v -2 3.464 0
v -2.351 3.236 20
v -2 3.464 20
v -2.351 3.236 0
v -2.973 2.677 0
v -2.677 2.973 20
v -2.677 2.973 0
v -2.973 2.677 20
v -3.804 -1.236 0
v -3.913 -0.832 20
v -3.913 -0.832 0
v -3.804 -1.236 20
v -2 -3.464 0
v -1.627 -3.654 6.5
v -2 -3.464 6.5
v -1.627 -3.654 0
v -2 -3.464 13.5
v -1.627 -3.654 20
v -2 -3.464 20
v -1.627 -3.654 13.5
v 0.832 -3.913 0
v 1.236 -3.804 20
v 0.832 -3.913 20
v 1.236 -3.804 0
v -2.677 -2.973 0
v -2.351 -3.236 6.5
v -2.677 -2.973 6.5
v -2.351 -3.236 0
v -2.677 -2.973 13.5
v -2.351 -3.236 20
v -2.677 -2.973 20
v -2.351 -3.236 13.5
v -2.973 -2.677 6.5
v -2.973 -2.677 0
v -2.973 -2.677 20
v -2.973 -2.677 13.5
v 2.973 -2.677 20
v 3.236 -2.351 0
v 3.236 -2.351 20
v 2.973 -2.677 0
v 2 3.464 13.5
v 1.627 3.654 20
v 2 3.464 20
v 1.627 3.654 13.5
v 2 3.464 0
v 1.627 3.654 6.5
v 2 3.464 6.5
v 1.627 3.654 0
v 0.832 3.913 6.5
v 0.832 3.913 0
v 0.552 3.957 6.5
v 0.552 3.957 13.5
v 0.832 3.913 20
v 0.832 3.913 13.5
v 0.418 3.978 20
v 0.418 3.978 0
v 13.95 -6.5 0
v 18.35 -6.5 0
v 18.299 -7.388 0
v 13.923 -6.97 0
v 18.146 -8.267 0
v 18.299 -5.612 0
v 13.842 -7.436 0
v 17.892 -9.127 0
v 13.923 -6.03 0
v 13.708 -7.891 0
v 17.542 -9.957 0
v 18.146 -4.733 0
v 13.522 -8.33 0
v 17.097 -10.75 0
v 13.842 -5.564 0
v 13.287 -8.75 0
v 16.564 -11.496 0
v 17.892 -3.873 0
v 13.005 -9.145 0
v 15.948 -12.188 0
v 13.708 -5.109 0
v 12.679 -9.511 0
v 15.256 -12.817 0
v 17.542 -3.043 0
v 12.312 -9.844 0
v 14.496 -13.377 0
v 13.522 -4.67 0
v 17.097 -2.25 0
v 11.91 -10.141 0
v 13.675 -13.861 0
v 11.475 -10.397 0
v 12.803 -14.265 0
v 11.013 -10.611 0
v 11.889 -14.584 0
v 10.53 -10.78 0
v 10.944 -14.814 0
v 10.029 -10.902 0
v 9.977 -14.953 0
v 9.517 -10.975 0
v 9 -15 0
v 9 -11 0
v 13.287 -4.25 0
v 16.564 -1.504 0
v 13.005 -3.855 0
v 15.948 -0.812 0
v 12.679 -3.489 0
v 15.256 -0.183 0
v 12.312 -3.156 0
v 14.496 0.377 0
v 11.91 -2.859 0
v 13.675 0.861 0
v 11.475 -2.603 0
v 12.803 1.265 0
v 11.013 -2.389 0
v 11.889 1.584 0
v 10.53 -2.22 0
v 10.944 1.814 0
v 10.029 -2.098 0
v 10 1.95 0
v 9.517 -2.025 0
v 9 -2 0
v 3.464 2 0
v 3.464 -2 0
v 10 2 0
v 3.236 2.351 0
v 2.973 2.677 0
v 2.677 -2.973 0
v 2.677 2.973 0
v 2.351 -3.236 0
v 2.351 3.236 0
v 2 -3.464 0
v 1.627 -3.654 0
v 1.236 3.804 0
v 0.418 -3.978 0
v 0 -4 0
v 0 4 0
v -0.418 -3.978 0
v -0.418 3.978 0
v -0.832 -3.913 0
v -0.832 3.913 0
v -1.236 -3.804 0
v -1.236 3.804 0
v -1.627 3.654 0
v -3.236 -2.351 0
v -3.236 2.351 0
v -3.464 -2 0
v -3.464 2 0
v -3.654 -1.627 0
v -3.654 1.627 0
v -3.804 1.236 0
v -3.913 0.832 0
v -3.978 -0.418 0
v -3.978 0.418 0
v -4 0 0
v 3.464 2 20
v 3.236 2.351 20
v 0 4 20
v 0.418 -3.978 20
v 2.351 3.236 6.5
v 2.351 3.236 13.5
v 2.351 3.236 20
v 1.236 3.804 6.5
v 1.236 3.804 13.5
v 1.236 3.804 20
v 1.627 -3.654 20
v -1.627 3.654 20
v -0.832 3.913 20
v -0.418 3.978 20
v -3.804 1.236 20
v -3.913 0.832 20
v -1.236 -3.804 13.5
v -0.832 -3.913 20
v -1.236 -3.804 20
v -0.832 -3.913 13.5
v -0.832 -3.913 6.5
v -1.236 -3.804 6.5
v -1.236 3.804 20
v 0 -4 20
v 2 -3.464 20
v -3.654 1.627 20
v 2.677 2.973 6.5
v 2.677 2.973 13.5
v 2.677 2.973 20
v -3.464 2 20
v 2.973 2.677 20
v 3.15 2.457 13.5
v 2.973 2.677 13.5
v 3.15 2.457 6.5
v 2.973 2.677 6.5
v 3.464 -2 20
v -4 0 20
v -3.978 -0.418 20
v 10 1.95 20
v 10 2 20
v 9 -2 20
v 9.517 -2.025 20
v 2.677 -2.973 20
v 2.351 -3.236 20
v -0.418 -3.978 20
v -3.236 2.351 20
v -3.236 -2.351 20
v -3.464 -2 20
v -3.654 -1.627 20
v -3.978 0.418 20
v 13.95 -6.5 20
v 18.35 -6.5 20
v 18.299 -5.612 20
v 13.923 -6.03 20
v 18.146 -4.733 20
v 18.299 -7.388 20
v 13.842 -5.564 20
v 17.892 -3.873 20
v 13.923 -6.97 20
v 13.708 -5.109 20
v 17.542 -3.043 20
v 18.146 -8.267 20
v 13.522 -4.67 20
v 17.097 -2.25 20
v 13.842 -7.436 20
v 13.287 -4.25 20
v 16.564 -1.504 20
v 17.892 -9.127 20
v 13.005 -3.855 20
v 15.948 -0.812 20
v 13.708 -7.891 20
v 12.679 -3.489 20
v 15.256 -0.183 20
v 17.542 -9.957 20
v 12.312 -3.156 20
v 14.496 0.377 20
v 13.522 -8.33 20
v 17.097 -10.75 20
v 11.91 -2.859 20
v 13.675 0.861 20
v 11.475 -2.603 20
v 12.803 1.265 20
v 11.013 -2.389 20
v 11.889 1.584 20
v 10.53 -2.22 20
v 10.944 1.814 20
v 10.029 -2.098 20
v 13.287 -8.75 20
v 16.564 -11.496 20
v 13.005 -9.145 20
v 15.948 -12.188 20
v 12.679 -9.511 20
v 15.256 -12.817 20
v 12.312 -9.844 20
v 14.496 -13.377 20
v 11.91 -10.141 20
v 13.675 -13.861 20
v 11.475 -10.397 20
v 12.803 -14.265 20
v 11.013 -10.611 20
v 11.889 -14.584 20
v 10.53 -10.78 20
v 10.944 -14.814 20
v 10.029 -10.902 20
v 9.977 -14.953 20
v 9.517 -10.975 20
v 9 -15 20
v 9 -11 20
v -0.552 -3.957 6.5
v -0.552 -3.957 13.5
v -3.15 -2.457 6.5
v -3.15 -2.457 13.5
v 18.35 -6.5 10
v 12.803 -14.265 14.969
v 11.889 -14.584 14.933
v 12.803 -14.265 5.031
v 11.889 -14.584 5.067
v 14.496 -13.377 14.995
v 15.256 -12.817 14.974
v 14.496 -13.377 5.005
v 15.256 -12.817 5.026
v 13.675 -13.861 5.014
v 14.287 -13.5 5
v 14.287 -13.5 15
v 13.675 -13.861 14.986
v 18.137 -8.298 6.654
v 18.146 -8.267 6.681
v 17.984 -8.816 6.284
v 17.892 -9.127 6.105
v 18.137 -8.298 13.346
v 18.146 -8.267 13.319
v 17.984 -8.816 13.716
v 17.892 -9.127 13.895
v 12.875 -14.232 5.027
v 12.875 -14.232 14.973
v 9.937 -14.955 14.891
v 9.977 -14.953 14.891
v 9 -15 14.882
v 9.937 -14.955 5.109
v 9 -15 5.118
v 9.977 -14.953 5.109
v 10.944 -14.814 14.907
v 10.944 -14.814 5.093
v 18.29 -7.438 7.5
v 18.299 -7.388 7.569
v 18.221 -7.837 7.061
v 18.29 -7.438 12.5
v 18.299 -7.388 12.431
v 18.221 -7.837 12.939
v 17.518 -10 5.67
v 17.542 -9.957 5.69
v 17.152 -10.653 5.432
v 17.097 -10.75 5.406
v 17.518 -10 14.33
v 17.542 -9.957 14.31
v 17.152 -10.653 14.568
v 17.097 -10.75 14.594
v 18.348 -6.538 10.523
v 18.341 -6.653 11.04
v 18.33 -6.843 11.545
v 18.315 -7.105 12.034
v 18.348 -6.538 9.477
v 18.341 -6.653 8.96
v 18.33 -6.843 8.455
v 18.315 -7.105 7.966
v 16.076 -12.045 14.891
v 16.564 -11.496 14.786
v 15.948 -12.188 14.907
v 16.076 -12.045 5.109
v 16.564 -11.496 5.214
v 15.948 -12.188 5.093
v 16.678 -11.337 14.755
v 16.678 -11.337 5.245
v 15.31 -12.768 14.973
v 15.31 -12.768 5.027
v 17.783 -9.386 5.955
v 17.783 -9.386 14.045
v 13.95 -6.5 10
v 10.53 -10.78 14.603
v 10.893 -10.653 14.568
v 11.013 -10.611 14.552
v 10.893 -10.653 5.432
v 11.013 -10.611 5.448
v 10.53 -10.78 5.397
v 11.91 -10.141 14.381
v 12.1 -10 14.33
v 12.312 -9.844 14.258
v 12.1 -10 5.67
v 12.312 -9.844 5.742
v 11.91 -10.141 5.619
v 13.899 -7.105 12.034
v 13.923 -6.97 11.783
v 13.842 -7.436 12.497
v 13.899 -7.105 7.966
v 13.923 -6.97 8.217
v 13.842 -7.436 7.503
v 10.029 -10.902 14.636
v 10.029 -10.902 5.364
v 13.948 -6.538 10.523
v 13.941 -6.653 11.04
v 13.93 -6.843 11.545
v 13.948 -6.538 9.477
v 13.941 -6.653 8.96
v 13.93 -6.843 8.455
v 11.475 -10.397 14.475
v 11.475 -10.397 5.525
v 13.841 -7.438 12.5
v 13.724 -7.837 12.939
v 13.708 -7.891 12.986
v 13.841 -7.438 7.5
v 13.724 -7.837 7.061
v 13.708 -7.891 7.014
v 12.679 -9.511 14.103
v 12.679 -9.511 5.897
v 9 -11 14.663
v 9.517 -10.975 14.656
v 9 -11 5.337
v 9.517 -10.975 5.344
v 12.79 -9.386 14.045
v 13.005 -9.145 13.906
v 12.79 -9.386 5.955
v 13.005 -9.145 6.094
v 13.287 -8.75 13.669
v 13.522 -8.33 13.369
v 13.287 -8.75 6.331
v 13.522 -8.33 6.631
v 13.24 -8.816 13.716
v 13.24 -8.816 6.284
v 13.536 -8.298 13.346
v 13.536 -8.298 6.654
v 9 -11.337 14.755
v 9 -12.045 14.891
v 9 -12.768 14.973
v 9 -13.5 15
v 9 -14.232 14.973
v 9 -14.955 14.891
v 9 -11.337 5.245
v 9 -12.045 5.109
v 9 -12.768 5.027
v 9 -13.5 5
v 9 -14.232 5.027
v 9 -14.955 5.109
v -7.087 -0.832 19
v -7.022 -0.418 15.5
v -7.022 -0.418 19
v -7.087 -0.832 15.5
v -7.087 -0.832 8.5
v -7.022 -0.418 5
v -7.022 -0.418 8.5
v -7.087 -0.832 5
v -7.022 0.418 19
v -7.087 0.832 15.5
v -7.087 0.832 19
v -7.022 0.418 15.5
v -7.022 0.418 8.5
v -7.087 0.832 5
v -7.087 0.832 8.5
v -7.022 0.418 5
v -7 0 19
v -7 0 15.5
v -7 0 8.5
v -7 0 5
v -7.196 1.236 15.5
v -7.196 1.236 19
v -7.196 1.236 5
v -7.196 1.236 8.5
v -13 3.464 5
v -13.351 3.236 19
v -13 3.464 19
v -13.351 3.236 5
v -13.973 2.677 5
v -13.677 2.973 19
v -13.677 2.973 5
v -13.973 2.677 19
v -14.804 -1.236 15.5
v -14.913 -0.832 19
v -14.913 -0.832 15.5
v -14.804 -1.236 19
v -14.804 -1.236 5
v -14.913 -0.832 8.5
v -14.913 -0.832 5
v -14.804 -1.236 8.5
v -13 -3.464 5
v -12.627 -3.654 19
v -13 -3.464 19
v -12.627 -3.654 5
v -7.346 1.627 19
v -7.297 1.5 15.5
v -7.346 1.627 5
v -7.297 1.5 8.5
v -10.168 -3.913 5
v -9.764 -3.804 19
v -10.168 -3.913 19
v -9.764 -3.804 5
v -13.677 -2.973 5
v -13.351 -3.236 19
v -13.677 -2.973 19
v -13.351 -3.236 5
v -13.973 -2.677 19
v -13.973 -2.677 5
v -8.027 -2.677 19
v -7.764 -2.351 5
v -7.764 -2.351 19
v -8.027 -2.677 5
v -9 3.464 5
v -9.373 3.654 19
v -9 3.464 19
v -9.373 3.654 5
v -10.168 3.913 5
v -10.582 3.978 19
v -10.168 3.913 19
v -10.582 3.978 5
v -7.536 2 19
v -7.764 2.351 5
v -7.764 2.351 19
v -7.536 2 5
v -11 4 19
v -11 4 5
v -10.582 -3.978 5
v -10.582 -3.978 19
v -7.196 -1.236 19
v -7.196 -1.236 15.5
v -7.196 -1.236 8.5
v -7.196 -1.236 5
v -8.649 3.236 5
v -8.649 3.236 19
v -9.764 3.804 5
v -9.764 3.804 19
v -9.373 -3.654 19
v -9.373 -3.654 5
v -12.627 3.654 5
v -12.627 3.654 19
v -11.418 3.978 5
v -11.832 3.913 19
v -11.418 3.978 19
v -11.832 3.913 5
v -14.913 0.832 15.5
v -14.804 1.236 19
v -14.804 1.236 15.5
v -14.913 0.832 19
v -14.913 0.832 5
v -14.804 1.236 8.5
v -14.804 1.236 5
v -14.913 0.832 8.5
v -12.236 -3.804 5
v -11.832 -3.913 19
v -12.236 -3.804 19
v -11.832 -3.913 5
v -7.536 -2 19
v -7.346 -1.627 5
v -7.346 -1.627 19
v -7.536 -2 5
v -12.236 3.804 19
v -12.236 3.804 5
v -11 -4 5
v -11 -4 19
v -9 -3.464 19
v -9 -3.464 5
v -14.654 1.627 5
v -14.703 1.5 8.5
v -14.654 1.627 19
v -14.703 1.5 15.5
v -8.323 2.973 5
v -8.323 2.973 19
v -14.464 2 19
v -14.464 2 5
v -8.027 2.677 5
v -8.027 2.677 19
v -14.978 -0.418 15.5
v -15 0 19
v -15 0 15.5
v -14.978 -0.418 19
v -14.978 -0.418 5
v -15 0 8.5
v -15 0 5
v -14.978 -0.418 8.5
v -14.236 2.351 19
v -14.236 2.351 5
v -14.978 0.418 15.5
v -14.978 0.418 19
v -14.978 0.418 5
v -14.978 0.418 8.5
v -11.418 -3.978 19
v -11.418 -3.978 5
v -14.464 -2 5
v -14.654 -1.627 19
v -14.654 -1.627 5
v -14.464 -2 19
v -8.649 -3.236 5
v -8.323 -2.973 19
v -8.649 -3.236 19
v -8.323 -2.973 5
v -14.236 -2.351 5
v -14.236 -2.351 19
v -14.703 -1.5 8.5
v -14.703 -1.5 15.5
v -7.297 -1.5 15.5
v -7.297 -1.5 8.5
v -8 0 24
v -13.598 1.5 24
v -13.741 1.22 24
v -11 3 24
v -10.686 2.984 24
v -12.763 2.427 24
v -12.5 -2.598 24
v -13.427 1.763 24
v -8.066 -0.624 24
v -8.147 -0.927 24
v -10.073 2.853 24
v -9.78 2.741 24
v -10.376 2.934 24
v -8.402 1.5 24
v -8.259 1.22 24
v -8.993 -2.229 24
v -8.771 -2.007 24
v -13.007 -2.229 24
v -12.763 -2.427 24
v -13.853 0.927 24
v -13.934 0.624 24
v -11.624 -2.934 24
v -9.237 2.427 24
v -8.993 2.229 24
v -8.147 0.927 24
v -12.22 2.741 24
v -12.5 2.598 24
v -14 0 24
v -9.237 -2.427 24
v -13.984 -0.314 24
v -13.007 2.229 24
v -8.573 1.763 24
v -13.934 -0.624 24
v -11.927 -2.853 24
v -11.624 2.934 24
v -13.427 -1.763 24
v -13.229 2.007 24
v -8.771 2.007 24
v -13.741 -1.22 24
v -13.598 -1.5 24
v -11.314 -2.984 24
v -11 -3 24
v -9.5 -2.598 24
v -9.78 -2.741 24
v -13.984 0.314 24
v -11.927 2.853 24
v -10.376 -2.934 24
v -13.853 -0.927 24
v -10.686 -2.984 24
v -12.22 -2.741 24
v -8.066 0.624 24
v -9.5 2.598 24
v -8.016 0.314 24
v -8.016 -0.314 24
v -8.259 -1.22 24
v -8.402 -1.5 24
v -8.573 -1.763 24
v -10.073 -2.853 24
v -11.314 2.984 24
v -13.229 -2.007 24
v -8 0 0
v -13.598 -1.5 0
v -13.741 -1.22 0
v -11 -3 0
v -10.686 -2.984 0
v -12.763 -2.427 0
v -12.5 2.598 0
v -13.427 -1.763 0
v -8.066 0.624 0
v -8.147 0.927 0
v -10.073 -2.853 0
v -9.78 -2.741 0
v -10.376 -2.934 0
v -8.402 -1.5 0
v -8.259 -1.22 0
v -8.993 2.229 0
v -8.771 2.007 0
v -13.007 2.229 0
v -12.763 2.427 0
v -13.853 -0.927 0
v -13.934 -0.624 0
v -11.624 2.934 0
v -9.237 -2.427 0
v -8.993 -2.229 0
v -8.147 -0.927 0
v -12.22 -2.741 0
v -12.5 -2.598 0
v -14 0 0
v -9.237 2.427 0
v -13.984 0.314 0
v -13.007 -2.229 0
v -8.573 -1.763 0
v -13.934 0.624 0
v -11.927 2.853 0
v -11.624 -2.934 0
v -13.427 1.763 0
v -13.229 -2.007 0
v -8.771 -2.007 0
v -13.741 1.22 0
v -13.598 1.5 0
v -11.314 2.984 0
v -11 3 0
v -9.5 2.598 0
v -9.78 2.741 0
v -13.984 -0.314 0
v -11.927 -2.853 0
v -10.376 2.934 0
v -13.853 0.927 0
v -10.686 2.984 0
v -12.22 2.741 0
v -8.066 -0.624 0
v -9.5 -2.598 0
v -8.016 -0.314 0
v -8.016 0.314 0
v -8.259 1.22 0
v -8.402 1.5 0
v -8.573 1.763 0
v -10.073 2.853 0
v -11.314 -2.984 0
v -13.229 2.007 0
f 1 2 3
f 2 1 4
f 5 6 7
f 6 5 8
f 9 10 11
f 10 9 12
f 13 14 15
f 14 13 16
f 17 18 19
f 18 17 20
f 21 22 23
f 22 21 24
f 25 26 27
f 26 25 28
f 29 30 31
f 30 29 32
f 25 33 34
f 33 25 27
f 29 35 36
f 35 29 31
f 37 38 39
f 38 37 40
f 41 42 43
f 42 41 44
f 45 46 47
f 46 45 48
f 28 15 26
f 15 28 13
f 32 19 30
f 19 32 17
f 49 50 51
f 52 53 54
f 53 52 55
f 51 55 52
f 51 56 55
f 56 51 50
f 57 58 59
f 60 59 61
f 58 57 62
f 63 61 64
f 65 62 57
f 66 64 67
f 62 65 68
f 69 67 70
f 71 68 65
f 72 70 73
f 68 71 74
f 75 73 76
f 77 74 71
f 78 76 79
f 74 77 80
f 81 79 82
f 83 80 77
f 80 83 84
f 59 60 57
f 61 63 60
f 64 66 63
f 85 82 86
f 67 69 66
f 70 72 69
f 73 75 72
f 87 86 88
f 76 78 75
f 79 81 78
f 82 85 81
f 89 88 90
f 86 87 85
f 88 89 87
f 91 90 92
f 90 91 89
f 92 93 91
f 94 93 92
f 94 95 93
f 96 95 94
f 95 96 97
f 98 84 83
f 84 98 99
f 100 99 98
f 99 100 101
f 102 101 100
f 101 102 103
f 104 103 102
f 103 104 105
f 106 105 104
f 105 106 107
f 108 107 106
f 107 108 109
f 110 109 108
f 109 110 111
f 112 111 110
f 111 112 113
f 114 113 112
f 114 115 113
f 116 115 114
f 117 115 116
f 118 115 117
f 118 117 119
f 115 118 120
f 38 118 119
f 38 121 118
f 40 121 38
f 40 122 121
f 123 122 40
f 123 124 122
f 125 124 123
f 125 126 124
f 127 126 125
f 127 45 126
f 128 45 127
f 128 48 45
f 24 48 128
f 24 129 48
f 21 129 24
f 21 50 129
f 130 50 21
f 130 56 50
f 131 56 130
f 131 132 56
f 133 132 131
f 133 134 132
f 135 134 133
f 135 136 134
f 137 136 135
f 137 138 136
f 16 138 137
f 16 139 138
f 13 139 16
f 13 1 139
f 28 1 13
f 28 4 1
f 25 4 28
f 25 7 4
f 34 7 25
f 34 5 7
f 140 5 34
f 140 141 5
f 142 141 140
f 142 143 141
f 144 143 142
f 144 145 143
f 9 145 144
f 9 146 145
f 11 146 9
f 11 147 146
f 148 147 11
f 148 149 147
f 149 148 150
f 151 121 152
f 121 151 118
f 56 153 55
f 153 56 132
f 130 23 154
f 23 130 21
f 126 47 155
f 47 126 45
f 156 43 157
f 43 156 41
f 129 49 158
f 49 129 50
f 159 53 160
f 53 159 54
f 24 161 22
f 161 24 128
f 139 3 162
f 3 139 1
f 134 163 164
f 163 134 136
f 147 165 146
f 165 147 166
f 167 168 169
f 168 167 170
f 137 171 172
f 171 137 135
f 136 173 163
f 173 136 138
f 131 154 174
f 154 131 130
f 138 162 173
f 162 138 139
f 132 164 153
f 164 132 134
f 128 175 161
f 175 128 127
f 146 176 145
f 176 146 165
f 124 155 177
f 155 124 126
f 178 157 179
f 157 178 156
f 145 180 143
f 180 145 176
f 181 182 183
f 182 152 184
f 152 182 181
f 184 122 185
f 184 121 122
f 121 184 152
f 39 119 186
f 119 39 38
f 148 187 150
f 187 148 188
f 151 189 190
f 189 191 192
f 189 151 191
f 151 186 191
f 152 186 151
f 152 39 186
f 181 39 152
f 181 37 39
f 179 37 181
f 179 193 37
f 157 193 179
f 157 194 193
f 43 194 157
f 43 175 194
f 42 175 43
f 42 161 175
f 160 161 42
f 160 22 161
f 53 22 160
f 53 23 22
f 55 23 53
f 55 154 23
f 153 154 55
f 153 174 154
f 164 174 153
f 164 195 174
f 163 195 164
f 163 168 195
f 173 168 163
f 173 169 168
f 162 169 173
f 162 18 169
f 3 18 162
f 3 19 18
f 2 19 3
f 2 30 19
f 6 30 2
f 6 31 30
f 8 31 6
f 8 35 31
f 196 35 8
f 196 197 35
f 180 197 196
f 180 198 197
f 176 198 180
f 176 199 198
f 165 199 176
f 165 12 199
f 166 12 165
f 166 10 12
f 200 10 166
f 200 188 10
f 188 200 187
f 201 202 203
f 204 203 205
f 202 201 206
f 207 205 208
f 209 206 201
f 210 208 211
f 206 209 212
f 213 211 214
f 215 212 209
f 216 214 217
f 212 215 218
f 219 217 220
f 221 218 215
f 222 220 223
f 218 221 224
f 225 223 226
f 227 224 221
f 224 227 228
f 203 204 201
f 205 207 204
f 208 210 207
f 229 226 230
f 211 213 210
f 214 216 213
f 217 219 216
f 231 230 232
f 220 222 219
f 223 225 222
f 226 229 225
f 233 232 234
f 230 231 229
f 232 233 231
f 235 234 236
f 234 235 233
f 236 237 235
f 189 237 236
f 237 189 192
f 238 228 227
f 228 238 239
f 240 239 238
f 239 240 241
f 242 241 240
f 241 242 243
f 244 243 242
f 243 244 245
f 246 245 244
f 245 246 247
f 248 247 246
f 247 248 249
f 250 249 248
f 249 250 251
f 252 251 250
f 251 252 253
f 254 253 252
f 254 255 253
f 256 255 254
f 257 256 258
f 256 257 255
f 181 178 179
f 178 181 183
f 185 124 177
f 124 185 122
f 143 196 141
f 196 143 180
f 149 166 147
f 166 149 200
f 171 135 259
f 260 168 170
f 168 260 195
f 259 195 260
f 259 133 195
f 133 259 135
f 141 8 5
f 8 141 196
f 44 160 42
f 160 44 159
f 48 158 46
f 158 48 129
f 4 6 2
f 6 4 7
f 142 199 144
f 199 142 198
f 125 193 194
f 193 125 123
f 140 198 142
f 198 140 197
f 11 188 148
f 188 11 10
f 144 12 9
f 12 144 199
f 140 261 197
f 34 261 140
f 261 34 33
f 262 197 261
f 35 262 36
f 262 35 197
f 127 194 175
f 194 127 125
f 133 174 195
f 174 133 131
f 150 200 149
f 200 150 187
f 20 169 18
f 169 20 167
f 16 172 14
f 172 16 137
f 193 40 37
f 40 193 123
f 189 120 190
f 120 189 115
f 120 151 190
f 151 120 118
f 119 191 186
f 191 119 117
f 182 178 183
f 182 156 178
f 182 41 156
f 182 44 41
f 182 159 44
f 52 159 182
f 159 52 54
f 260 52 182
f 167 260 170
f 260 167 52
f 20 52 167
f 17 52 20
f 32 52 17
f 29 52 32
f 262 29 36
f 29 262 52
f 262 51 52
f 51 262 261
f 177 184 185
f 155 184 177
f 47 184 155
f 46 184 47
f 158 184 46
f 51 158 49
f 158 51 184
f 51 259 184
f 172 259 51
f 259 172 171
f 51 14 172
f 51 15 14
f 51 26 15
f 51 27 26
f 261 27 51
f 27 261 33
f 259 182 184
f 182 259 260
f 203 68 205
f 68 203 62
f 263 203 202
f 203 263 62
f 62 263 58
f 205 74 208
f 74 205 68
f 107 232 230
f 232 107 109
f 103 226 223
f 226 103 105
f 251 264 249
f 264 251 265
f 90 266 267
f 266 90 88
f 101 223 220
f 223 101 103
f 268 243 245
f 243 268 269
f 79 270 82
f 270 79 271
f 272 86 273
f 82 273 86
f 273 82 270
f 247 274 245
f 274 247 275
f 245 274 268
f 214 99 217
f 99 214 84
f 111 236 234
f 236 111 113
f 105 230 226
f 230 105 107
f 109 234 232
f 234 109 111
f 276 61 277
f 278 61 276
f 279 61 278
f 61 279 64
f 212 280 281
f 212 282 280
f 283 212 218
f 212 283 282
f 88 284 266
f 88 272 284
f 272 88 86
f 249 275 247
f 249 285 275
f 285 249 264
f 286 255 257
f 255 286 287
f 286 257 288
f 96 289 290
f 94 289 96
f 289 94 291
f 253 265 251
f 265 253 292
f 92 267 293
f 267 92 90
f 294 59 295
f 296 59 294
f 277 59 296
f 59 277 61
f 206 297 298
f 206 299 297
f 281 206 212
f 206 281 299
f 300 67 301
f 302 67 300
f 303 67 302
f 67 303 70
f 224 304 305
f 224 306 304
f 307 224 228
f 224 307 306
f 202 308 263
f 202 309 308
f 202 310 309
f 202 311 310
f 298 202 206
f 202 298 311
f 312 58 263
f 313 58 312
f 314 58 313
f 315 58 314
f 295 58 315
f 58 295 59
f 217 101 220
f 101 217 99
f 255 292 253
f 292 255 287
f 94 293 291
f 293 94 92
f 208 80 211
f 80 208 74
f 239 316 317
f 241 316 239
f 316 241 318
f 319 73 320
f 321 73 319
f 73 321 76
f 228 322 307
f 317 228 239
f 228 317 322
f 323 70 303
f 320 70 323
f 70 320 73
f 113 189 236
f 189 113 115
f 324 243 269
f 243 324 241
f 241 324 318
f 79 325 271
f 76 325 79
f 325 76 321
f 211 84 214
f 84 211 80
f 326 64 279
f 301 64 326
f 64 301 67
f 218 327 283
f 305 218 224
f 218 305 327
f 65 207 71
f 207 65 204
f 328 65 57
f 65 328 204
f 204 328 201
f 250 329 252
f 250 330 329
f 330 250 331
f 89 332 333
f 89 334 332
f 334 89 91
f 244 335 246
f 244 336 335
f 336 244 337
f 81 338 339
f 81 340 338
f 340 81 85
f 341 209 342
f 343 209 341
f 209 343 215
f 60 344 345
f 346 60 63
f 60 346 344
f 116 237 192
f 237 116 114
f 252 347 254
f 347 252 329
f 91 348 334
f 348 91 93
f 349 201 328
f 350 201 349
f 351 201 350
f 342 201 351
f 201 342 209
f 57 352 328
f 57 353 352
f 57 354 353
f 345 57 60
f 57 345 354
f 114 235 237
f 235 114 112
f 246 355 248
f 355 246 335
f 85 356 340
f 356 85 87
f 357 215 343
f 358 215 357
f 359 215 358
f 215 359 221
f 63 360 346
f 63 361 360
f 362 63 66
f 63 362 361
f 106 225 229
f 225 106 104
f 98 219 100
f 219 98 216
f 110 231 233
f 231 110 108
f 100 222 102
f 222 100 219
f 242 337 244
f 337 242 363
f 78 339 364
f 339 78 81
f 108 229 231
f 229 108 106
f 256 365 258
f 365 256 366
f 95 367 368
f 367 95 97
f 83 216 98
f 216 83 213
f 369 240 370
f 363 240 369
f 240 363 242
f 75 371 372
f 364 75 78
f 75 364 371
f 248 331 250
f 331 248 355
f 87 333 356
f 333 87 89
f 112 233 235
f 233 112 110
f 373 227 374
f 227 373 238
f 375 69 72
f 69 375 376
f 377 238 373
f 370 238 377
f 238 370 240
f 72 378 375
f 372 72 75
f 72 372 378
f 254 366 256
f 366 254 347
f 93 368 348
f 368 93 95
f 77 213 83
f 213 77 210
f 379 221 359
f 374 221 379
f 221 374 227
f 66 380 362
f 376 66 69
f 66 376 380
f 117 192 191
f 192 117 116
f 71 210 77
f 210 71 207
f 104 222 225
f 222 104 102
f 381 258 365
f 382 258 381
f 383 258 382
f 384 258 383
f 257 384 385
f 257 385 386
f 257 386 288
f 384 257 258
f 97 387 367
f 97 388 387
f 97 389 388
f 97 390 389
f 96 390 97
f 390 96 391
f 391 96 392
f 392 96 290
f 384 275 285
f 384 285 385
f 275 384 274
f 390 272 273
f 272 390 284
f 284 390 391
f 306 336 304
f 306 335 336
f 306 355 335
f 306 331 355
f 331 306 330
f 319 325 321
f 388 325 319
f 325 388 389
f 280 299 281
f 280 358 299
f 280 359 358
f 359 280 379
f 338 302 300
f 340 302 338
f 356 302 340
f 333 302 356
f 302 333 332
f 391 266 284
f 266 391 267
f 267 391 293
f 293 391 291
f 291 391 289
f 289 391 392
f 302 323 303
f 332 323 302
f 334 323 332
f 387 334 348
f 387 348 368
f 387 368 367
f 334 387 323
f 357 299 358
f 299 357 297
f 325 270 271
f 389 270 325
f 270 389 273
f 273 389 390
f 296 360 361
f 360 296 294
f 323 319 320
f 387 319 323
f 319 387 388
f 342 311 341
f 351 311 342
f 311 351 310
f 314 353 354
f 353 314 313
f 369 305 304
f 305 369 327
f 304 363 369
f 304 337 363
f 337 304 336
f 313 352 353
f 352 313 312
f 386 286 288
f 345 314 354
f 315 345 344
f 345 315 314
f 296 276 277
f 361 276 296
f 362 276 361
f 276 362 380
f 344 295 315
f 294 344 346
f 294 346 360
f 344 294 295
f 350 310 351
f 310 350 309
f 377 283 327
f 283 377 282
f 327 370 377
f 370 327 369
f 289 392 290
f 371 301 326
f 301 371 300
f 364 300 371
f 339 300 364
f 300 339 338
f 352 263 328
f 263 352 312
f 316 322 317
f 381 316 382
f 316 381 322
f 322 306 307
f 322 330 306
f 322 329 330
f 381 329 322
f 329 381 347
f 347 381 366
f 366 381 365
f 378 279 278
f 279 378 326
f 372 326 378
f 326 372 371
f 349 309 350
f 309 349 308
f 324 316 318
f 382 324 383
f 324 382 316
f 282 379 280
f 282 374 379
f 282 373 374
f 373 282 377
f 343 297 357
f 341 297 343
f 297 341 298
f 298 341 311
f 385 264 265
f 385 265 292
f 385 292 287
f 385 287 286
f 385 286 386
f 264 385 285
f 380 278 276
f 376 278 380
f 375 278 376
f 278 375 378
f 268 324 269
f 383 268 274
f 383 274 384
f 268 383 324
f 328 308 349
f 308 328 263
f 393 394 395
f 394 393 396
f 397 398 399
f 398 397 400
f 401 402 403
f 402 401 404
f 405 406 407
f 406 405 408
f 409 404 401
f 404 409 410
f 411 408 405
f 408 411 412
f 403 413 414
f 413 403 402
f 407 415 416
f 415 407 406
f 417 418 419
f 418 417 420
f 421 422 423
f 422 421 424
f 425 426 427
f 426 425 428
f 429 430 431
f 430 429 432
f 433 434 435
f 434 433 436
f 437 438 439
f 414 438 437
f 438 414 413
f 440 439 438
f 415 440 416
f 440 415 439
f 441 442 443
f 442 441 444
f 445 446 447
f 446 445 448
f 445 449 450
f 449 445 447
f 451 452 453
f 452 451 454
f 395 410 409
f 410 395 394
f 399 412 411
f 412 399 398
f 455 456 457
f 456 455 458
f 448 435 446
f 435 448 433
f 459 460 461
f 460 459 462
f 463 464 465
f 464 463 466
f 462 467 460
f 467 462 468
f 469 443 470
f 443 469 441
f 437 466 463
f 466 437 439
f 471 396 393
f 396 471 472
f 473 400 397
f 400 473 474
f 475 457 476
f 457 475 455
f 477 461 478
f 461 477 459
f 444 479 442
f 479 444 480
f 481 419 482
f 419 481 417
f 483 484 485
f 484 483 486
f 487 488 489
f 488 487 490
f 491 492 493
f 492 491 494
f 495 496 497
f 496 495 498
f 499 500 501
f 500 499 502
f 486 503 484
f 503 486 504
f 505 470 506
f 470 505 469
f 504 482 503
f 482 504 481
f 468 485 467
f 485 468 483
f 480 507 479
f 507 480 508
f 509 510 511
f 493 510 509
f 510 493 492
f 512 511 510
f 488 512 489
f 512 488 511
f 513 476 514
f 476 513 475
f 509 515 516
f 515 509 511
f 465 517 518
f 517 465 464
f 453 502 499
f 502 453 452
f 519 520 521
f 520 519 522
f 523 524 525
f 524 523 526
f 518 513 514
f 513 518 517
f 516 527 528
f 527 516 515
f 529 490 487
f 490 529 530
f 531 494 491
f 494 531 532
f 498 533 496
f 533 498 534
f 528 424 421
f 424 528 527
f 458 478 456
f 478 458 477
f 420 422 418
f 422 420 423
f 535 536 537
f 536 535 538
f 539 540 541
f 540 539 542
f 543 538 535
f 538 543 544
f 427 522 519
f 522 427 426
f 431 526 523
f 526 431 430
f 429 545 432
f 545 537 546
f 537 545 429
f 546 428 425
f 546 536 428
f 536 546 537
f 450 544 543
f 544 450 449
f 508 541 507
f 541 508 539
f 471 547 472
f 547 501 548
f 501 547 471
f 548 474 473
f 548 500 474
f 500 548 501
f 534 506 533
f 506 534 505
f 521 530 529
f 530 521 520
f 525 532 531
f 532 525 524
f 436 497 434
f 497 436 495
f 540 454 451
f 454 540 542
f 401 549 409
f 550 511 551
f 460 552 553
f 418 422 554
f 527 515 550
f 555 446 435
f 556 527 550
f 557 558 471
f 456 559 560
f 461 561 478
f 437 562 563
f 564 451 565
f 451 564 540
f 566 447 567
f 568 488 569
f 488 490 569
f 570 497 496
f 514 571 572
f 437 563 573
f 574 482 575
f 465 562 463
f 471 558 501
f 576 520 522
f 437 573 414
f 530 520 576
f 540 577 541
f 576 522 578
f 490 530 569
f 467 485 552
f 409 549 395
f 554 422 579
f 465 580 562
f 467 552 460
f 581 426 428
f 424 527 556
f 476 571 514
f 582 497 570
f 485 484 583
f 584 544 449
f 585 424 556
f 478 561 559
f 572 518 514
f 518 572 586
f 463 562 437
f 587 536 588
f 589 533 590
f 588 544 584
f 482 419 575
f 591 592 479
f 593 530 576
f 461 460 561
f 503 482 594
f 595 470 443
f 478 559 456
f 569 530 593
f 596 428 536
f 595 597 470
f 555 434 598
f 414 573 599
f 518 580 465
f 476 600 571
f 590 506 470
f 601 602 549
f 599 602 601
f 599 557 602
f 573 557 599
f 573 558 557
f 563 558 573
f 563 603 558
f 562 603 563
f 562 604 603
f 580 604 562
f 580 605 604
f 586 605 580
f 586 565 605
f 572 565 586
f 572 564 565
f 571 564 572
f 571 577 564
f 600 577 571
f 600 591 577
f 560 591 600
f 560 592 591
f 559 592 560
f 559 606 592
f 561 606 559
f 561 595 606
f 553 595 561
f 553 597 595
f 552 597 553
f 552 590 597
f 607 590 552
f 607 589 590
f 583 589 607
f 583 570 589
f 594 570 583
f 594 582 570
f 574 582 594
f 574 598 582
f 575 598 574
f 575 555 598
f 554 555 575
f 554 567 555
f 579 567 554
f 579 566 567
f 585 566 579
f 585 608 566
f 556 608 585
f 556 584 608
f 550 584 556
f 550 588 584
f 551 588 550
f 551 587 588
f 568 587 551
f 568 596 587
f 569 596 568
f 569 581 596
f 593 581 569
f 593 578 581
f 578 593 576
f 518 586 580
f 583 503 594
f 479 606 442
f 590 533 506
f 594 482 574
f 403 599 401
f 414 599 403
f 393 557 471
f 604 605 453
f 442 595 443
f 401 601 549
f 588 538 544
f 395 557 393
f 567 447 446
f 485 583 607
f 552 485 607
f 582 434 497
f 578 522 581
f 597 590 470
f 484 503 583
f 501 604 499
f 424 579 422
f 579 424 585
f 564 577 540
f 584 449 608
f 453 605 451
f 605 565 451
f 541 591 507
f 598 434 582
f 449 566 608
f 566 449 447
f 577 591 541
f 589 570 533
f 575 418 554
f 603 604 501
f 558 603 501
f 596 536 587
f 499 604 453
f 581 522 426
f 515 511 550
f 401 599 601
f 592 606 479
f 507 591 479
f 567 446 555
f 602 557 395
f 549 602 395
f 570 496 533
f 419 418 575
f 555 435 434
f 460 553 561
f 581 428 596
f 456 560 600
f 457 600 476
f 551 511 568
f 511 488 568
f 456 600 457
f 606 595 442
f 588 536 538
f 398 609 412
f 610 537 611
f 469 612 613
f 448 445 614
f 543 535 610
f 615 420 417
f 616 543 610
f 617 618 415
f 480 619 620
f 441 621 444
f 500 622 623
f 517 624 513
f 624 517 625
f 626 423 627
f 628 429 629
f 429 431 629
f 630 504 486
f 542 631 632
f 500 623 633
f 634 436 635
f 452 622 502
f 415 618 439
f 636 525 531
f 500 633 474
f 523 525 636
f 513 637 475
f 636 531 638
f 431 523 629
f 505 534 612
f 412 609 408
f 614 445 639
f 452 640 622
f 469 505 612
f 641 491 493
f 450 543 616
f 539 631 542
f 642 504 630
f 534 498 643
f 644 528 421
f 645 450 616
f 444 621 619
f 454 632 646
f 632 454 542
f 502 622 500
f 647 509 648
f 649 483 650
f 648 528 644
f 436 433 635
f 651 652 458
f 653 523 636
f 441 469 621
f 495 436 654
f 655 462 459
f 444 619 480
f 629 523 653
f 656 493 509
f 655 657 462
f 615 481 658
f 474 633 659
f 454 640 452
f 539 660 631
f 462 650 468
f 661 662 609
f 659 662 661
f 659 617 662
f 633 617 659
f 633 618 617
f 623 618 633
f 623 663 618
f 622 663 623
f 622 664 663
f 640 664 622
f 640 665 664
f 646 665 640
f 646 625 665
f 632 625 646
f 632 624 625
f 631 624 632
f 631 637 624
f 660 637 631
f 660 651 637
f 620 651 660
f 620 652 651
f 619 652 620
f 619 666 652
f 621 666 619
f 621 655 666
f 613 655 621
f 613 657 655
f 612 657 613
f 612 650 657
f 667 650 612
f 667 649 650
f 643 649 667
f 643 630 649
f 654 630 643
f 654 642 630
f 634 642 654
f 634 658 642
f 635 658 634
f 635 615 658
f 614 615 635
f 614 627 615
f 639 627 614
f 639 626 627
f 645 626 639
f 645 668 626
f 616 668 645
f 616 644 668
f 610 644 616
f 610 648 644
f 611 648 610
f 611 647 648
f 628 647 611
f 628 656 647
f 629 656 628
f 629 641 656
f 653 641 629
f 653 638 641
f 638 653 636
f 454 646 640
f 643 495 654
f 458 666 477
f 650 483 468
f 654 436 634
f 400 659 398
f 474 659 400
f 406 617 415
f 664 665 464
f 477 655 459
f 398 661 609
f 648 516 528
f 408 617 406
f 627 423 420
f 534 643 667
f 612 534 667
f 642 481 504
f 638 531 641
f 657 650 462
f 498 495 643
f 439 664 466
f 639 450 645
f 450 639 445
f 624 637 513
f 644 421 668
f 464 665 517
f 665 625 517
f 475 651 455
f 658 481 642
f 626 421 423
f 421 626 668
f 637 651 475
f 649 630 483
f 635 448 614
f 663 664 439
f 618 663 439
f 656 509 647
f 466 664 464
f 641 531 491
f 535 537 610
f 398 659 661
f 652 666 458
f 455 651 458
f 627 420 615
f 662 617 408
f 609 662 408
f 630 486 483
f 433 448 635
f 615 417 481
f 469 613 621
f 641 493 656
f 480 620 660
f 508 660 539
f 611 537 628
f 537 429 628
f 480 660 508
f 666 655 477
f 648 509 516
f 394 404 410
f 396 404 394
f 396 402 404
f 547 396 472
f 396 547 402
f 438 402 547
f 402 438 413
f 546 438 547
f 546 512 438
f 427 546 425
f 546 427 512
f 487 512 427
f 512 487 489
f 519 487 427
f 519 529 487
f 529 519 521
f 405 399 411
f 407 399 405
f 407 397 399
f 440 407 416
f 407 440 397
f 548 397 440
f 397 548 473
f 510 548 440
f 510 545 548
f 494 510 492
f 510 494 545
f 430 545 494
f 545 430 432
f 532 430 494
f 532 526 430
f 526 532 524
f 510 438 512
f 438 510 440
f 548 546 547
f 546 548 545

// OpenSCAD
//Bar and catch
//Print with a brim for stability
//
//Daniel Urquhart 2018


// Which one would you like to see?
part = "both"; // [bar,catch,both]

//height of slot for tie 
slotHeight = 7;

//height for catch, bar is slightly larger
catchHeight = 10;

/* [Hidden] */
$fa=6 ;
$fs=0.2;

module bar(a,b)
{
difference()
{
	for(i = [0,180]) rotate([i,0,0])
	{
		cylinder(a, r=4);
		translate([0,0,a])
			cylinder(b, d1=8,d2=6);
	}
	cube([10,3,slotHeight], center=true);
}

}

module catch(h=12)
{
	thickness=4;
	difference()
	{
		union(){
			cylinder(h*2, d=8, center=true);
			translate([5,0,0])
				cube([10,thickness,h*2], center=true);
		}
		rotate([0,0,60])
			cube([10,3,slotHeight], center=true);
	}
	
	translate([9,-(9+thickness )/2,0])scale([1.1,1,1])
	difference()
	{
		cylinder(h*2, r=4.5+thickness, center=true);
		cylinder(1+h*2, r=4.5, center=true);
		translate([-10,0,0])
			cube([20,20,h*2+1], center=true);
		translate([4,-h*0.7,0])scale([1,1.4,1])rotate([0,90,0])
			cylinder(15, r=h/2, center=true);
	}

}

if(part == "both" || part == "catch")
translate([0,0,10])
	catch(catchHeight);

if(part == "both" || part == "bar")
translate([-11,0,catchHeight*0.1*(7+5)])color([0.6,0.6,0.6])
	bar(catchHeight*7/10,catchHeight*5/10);
